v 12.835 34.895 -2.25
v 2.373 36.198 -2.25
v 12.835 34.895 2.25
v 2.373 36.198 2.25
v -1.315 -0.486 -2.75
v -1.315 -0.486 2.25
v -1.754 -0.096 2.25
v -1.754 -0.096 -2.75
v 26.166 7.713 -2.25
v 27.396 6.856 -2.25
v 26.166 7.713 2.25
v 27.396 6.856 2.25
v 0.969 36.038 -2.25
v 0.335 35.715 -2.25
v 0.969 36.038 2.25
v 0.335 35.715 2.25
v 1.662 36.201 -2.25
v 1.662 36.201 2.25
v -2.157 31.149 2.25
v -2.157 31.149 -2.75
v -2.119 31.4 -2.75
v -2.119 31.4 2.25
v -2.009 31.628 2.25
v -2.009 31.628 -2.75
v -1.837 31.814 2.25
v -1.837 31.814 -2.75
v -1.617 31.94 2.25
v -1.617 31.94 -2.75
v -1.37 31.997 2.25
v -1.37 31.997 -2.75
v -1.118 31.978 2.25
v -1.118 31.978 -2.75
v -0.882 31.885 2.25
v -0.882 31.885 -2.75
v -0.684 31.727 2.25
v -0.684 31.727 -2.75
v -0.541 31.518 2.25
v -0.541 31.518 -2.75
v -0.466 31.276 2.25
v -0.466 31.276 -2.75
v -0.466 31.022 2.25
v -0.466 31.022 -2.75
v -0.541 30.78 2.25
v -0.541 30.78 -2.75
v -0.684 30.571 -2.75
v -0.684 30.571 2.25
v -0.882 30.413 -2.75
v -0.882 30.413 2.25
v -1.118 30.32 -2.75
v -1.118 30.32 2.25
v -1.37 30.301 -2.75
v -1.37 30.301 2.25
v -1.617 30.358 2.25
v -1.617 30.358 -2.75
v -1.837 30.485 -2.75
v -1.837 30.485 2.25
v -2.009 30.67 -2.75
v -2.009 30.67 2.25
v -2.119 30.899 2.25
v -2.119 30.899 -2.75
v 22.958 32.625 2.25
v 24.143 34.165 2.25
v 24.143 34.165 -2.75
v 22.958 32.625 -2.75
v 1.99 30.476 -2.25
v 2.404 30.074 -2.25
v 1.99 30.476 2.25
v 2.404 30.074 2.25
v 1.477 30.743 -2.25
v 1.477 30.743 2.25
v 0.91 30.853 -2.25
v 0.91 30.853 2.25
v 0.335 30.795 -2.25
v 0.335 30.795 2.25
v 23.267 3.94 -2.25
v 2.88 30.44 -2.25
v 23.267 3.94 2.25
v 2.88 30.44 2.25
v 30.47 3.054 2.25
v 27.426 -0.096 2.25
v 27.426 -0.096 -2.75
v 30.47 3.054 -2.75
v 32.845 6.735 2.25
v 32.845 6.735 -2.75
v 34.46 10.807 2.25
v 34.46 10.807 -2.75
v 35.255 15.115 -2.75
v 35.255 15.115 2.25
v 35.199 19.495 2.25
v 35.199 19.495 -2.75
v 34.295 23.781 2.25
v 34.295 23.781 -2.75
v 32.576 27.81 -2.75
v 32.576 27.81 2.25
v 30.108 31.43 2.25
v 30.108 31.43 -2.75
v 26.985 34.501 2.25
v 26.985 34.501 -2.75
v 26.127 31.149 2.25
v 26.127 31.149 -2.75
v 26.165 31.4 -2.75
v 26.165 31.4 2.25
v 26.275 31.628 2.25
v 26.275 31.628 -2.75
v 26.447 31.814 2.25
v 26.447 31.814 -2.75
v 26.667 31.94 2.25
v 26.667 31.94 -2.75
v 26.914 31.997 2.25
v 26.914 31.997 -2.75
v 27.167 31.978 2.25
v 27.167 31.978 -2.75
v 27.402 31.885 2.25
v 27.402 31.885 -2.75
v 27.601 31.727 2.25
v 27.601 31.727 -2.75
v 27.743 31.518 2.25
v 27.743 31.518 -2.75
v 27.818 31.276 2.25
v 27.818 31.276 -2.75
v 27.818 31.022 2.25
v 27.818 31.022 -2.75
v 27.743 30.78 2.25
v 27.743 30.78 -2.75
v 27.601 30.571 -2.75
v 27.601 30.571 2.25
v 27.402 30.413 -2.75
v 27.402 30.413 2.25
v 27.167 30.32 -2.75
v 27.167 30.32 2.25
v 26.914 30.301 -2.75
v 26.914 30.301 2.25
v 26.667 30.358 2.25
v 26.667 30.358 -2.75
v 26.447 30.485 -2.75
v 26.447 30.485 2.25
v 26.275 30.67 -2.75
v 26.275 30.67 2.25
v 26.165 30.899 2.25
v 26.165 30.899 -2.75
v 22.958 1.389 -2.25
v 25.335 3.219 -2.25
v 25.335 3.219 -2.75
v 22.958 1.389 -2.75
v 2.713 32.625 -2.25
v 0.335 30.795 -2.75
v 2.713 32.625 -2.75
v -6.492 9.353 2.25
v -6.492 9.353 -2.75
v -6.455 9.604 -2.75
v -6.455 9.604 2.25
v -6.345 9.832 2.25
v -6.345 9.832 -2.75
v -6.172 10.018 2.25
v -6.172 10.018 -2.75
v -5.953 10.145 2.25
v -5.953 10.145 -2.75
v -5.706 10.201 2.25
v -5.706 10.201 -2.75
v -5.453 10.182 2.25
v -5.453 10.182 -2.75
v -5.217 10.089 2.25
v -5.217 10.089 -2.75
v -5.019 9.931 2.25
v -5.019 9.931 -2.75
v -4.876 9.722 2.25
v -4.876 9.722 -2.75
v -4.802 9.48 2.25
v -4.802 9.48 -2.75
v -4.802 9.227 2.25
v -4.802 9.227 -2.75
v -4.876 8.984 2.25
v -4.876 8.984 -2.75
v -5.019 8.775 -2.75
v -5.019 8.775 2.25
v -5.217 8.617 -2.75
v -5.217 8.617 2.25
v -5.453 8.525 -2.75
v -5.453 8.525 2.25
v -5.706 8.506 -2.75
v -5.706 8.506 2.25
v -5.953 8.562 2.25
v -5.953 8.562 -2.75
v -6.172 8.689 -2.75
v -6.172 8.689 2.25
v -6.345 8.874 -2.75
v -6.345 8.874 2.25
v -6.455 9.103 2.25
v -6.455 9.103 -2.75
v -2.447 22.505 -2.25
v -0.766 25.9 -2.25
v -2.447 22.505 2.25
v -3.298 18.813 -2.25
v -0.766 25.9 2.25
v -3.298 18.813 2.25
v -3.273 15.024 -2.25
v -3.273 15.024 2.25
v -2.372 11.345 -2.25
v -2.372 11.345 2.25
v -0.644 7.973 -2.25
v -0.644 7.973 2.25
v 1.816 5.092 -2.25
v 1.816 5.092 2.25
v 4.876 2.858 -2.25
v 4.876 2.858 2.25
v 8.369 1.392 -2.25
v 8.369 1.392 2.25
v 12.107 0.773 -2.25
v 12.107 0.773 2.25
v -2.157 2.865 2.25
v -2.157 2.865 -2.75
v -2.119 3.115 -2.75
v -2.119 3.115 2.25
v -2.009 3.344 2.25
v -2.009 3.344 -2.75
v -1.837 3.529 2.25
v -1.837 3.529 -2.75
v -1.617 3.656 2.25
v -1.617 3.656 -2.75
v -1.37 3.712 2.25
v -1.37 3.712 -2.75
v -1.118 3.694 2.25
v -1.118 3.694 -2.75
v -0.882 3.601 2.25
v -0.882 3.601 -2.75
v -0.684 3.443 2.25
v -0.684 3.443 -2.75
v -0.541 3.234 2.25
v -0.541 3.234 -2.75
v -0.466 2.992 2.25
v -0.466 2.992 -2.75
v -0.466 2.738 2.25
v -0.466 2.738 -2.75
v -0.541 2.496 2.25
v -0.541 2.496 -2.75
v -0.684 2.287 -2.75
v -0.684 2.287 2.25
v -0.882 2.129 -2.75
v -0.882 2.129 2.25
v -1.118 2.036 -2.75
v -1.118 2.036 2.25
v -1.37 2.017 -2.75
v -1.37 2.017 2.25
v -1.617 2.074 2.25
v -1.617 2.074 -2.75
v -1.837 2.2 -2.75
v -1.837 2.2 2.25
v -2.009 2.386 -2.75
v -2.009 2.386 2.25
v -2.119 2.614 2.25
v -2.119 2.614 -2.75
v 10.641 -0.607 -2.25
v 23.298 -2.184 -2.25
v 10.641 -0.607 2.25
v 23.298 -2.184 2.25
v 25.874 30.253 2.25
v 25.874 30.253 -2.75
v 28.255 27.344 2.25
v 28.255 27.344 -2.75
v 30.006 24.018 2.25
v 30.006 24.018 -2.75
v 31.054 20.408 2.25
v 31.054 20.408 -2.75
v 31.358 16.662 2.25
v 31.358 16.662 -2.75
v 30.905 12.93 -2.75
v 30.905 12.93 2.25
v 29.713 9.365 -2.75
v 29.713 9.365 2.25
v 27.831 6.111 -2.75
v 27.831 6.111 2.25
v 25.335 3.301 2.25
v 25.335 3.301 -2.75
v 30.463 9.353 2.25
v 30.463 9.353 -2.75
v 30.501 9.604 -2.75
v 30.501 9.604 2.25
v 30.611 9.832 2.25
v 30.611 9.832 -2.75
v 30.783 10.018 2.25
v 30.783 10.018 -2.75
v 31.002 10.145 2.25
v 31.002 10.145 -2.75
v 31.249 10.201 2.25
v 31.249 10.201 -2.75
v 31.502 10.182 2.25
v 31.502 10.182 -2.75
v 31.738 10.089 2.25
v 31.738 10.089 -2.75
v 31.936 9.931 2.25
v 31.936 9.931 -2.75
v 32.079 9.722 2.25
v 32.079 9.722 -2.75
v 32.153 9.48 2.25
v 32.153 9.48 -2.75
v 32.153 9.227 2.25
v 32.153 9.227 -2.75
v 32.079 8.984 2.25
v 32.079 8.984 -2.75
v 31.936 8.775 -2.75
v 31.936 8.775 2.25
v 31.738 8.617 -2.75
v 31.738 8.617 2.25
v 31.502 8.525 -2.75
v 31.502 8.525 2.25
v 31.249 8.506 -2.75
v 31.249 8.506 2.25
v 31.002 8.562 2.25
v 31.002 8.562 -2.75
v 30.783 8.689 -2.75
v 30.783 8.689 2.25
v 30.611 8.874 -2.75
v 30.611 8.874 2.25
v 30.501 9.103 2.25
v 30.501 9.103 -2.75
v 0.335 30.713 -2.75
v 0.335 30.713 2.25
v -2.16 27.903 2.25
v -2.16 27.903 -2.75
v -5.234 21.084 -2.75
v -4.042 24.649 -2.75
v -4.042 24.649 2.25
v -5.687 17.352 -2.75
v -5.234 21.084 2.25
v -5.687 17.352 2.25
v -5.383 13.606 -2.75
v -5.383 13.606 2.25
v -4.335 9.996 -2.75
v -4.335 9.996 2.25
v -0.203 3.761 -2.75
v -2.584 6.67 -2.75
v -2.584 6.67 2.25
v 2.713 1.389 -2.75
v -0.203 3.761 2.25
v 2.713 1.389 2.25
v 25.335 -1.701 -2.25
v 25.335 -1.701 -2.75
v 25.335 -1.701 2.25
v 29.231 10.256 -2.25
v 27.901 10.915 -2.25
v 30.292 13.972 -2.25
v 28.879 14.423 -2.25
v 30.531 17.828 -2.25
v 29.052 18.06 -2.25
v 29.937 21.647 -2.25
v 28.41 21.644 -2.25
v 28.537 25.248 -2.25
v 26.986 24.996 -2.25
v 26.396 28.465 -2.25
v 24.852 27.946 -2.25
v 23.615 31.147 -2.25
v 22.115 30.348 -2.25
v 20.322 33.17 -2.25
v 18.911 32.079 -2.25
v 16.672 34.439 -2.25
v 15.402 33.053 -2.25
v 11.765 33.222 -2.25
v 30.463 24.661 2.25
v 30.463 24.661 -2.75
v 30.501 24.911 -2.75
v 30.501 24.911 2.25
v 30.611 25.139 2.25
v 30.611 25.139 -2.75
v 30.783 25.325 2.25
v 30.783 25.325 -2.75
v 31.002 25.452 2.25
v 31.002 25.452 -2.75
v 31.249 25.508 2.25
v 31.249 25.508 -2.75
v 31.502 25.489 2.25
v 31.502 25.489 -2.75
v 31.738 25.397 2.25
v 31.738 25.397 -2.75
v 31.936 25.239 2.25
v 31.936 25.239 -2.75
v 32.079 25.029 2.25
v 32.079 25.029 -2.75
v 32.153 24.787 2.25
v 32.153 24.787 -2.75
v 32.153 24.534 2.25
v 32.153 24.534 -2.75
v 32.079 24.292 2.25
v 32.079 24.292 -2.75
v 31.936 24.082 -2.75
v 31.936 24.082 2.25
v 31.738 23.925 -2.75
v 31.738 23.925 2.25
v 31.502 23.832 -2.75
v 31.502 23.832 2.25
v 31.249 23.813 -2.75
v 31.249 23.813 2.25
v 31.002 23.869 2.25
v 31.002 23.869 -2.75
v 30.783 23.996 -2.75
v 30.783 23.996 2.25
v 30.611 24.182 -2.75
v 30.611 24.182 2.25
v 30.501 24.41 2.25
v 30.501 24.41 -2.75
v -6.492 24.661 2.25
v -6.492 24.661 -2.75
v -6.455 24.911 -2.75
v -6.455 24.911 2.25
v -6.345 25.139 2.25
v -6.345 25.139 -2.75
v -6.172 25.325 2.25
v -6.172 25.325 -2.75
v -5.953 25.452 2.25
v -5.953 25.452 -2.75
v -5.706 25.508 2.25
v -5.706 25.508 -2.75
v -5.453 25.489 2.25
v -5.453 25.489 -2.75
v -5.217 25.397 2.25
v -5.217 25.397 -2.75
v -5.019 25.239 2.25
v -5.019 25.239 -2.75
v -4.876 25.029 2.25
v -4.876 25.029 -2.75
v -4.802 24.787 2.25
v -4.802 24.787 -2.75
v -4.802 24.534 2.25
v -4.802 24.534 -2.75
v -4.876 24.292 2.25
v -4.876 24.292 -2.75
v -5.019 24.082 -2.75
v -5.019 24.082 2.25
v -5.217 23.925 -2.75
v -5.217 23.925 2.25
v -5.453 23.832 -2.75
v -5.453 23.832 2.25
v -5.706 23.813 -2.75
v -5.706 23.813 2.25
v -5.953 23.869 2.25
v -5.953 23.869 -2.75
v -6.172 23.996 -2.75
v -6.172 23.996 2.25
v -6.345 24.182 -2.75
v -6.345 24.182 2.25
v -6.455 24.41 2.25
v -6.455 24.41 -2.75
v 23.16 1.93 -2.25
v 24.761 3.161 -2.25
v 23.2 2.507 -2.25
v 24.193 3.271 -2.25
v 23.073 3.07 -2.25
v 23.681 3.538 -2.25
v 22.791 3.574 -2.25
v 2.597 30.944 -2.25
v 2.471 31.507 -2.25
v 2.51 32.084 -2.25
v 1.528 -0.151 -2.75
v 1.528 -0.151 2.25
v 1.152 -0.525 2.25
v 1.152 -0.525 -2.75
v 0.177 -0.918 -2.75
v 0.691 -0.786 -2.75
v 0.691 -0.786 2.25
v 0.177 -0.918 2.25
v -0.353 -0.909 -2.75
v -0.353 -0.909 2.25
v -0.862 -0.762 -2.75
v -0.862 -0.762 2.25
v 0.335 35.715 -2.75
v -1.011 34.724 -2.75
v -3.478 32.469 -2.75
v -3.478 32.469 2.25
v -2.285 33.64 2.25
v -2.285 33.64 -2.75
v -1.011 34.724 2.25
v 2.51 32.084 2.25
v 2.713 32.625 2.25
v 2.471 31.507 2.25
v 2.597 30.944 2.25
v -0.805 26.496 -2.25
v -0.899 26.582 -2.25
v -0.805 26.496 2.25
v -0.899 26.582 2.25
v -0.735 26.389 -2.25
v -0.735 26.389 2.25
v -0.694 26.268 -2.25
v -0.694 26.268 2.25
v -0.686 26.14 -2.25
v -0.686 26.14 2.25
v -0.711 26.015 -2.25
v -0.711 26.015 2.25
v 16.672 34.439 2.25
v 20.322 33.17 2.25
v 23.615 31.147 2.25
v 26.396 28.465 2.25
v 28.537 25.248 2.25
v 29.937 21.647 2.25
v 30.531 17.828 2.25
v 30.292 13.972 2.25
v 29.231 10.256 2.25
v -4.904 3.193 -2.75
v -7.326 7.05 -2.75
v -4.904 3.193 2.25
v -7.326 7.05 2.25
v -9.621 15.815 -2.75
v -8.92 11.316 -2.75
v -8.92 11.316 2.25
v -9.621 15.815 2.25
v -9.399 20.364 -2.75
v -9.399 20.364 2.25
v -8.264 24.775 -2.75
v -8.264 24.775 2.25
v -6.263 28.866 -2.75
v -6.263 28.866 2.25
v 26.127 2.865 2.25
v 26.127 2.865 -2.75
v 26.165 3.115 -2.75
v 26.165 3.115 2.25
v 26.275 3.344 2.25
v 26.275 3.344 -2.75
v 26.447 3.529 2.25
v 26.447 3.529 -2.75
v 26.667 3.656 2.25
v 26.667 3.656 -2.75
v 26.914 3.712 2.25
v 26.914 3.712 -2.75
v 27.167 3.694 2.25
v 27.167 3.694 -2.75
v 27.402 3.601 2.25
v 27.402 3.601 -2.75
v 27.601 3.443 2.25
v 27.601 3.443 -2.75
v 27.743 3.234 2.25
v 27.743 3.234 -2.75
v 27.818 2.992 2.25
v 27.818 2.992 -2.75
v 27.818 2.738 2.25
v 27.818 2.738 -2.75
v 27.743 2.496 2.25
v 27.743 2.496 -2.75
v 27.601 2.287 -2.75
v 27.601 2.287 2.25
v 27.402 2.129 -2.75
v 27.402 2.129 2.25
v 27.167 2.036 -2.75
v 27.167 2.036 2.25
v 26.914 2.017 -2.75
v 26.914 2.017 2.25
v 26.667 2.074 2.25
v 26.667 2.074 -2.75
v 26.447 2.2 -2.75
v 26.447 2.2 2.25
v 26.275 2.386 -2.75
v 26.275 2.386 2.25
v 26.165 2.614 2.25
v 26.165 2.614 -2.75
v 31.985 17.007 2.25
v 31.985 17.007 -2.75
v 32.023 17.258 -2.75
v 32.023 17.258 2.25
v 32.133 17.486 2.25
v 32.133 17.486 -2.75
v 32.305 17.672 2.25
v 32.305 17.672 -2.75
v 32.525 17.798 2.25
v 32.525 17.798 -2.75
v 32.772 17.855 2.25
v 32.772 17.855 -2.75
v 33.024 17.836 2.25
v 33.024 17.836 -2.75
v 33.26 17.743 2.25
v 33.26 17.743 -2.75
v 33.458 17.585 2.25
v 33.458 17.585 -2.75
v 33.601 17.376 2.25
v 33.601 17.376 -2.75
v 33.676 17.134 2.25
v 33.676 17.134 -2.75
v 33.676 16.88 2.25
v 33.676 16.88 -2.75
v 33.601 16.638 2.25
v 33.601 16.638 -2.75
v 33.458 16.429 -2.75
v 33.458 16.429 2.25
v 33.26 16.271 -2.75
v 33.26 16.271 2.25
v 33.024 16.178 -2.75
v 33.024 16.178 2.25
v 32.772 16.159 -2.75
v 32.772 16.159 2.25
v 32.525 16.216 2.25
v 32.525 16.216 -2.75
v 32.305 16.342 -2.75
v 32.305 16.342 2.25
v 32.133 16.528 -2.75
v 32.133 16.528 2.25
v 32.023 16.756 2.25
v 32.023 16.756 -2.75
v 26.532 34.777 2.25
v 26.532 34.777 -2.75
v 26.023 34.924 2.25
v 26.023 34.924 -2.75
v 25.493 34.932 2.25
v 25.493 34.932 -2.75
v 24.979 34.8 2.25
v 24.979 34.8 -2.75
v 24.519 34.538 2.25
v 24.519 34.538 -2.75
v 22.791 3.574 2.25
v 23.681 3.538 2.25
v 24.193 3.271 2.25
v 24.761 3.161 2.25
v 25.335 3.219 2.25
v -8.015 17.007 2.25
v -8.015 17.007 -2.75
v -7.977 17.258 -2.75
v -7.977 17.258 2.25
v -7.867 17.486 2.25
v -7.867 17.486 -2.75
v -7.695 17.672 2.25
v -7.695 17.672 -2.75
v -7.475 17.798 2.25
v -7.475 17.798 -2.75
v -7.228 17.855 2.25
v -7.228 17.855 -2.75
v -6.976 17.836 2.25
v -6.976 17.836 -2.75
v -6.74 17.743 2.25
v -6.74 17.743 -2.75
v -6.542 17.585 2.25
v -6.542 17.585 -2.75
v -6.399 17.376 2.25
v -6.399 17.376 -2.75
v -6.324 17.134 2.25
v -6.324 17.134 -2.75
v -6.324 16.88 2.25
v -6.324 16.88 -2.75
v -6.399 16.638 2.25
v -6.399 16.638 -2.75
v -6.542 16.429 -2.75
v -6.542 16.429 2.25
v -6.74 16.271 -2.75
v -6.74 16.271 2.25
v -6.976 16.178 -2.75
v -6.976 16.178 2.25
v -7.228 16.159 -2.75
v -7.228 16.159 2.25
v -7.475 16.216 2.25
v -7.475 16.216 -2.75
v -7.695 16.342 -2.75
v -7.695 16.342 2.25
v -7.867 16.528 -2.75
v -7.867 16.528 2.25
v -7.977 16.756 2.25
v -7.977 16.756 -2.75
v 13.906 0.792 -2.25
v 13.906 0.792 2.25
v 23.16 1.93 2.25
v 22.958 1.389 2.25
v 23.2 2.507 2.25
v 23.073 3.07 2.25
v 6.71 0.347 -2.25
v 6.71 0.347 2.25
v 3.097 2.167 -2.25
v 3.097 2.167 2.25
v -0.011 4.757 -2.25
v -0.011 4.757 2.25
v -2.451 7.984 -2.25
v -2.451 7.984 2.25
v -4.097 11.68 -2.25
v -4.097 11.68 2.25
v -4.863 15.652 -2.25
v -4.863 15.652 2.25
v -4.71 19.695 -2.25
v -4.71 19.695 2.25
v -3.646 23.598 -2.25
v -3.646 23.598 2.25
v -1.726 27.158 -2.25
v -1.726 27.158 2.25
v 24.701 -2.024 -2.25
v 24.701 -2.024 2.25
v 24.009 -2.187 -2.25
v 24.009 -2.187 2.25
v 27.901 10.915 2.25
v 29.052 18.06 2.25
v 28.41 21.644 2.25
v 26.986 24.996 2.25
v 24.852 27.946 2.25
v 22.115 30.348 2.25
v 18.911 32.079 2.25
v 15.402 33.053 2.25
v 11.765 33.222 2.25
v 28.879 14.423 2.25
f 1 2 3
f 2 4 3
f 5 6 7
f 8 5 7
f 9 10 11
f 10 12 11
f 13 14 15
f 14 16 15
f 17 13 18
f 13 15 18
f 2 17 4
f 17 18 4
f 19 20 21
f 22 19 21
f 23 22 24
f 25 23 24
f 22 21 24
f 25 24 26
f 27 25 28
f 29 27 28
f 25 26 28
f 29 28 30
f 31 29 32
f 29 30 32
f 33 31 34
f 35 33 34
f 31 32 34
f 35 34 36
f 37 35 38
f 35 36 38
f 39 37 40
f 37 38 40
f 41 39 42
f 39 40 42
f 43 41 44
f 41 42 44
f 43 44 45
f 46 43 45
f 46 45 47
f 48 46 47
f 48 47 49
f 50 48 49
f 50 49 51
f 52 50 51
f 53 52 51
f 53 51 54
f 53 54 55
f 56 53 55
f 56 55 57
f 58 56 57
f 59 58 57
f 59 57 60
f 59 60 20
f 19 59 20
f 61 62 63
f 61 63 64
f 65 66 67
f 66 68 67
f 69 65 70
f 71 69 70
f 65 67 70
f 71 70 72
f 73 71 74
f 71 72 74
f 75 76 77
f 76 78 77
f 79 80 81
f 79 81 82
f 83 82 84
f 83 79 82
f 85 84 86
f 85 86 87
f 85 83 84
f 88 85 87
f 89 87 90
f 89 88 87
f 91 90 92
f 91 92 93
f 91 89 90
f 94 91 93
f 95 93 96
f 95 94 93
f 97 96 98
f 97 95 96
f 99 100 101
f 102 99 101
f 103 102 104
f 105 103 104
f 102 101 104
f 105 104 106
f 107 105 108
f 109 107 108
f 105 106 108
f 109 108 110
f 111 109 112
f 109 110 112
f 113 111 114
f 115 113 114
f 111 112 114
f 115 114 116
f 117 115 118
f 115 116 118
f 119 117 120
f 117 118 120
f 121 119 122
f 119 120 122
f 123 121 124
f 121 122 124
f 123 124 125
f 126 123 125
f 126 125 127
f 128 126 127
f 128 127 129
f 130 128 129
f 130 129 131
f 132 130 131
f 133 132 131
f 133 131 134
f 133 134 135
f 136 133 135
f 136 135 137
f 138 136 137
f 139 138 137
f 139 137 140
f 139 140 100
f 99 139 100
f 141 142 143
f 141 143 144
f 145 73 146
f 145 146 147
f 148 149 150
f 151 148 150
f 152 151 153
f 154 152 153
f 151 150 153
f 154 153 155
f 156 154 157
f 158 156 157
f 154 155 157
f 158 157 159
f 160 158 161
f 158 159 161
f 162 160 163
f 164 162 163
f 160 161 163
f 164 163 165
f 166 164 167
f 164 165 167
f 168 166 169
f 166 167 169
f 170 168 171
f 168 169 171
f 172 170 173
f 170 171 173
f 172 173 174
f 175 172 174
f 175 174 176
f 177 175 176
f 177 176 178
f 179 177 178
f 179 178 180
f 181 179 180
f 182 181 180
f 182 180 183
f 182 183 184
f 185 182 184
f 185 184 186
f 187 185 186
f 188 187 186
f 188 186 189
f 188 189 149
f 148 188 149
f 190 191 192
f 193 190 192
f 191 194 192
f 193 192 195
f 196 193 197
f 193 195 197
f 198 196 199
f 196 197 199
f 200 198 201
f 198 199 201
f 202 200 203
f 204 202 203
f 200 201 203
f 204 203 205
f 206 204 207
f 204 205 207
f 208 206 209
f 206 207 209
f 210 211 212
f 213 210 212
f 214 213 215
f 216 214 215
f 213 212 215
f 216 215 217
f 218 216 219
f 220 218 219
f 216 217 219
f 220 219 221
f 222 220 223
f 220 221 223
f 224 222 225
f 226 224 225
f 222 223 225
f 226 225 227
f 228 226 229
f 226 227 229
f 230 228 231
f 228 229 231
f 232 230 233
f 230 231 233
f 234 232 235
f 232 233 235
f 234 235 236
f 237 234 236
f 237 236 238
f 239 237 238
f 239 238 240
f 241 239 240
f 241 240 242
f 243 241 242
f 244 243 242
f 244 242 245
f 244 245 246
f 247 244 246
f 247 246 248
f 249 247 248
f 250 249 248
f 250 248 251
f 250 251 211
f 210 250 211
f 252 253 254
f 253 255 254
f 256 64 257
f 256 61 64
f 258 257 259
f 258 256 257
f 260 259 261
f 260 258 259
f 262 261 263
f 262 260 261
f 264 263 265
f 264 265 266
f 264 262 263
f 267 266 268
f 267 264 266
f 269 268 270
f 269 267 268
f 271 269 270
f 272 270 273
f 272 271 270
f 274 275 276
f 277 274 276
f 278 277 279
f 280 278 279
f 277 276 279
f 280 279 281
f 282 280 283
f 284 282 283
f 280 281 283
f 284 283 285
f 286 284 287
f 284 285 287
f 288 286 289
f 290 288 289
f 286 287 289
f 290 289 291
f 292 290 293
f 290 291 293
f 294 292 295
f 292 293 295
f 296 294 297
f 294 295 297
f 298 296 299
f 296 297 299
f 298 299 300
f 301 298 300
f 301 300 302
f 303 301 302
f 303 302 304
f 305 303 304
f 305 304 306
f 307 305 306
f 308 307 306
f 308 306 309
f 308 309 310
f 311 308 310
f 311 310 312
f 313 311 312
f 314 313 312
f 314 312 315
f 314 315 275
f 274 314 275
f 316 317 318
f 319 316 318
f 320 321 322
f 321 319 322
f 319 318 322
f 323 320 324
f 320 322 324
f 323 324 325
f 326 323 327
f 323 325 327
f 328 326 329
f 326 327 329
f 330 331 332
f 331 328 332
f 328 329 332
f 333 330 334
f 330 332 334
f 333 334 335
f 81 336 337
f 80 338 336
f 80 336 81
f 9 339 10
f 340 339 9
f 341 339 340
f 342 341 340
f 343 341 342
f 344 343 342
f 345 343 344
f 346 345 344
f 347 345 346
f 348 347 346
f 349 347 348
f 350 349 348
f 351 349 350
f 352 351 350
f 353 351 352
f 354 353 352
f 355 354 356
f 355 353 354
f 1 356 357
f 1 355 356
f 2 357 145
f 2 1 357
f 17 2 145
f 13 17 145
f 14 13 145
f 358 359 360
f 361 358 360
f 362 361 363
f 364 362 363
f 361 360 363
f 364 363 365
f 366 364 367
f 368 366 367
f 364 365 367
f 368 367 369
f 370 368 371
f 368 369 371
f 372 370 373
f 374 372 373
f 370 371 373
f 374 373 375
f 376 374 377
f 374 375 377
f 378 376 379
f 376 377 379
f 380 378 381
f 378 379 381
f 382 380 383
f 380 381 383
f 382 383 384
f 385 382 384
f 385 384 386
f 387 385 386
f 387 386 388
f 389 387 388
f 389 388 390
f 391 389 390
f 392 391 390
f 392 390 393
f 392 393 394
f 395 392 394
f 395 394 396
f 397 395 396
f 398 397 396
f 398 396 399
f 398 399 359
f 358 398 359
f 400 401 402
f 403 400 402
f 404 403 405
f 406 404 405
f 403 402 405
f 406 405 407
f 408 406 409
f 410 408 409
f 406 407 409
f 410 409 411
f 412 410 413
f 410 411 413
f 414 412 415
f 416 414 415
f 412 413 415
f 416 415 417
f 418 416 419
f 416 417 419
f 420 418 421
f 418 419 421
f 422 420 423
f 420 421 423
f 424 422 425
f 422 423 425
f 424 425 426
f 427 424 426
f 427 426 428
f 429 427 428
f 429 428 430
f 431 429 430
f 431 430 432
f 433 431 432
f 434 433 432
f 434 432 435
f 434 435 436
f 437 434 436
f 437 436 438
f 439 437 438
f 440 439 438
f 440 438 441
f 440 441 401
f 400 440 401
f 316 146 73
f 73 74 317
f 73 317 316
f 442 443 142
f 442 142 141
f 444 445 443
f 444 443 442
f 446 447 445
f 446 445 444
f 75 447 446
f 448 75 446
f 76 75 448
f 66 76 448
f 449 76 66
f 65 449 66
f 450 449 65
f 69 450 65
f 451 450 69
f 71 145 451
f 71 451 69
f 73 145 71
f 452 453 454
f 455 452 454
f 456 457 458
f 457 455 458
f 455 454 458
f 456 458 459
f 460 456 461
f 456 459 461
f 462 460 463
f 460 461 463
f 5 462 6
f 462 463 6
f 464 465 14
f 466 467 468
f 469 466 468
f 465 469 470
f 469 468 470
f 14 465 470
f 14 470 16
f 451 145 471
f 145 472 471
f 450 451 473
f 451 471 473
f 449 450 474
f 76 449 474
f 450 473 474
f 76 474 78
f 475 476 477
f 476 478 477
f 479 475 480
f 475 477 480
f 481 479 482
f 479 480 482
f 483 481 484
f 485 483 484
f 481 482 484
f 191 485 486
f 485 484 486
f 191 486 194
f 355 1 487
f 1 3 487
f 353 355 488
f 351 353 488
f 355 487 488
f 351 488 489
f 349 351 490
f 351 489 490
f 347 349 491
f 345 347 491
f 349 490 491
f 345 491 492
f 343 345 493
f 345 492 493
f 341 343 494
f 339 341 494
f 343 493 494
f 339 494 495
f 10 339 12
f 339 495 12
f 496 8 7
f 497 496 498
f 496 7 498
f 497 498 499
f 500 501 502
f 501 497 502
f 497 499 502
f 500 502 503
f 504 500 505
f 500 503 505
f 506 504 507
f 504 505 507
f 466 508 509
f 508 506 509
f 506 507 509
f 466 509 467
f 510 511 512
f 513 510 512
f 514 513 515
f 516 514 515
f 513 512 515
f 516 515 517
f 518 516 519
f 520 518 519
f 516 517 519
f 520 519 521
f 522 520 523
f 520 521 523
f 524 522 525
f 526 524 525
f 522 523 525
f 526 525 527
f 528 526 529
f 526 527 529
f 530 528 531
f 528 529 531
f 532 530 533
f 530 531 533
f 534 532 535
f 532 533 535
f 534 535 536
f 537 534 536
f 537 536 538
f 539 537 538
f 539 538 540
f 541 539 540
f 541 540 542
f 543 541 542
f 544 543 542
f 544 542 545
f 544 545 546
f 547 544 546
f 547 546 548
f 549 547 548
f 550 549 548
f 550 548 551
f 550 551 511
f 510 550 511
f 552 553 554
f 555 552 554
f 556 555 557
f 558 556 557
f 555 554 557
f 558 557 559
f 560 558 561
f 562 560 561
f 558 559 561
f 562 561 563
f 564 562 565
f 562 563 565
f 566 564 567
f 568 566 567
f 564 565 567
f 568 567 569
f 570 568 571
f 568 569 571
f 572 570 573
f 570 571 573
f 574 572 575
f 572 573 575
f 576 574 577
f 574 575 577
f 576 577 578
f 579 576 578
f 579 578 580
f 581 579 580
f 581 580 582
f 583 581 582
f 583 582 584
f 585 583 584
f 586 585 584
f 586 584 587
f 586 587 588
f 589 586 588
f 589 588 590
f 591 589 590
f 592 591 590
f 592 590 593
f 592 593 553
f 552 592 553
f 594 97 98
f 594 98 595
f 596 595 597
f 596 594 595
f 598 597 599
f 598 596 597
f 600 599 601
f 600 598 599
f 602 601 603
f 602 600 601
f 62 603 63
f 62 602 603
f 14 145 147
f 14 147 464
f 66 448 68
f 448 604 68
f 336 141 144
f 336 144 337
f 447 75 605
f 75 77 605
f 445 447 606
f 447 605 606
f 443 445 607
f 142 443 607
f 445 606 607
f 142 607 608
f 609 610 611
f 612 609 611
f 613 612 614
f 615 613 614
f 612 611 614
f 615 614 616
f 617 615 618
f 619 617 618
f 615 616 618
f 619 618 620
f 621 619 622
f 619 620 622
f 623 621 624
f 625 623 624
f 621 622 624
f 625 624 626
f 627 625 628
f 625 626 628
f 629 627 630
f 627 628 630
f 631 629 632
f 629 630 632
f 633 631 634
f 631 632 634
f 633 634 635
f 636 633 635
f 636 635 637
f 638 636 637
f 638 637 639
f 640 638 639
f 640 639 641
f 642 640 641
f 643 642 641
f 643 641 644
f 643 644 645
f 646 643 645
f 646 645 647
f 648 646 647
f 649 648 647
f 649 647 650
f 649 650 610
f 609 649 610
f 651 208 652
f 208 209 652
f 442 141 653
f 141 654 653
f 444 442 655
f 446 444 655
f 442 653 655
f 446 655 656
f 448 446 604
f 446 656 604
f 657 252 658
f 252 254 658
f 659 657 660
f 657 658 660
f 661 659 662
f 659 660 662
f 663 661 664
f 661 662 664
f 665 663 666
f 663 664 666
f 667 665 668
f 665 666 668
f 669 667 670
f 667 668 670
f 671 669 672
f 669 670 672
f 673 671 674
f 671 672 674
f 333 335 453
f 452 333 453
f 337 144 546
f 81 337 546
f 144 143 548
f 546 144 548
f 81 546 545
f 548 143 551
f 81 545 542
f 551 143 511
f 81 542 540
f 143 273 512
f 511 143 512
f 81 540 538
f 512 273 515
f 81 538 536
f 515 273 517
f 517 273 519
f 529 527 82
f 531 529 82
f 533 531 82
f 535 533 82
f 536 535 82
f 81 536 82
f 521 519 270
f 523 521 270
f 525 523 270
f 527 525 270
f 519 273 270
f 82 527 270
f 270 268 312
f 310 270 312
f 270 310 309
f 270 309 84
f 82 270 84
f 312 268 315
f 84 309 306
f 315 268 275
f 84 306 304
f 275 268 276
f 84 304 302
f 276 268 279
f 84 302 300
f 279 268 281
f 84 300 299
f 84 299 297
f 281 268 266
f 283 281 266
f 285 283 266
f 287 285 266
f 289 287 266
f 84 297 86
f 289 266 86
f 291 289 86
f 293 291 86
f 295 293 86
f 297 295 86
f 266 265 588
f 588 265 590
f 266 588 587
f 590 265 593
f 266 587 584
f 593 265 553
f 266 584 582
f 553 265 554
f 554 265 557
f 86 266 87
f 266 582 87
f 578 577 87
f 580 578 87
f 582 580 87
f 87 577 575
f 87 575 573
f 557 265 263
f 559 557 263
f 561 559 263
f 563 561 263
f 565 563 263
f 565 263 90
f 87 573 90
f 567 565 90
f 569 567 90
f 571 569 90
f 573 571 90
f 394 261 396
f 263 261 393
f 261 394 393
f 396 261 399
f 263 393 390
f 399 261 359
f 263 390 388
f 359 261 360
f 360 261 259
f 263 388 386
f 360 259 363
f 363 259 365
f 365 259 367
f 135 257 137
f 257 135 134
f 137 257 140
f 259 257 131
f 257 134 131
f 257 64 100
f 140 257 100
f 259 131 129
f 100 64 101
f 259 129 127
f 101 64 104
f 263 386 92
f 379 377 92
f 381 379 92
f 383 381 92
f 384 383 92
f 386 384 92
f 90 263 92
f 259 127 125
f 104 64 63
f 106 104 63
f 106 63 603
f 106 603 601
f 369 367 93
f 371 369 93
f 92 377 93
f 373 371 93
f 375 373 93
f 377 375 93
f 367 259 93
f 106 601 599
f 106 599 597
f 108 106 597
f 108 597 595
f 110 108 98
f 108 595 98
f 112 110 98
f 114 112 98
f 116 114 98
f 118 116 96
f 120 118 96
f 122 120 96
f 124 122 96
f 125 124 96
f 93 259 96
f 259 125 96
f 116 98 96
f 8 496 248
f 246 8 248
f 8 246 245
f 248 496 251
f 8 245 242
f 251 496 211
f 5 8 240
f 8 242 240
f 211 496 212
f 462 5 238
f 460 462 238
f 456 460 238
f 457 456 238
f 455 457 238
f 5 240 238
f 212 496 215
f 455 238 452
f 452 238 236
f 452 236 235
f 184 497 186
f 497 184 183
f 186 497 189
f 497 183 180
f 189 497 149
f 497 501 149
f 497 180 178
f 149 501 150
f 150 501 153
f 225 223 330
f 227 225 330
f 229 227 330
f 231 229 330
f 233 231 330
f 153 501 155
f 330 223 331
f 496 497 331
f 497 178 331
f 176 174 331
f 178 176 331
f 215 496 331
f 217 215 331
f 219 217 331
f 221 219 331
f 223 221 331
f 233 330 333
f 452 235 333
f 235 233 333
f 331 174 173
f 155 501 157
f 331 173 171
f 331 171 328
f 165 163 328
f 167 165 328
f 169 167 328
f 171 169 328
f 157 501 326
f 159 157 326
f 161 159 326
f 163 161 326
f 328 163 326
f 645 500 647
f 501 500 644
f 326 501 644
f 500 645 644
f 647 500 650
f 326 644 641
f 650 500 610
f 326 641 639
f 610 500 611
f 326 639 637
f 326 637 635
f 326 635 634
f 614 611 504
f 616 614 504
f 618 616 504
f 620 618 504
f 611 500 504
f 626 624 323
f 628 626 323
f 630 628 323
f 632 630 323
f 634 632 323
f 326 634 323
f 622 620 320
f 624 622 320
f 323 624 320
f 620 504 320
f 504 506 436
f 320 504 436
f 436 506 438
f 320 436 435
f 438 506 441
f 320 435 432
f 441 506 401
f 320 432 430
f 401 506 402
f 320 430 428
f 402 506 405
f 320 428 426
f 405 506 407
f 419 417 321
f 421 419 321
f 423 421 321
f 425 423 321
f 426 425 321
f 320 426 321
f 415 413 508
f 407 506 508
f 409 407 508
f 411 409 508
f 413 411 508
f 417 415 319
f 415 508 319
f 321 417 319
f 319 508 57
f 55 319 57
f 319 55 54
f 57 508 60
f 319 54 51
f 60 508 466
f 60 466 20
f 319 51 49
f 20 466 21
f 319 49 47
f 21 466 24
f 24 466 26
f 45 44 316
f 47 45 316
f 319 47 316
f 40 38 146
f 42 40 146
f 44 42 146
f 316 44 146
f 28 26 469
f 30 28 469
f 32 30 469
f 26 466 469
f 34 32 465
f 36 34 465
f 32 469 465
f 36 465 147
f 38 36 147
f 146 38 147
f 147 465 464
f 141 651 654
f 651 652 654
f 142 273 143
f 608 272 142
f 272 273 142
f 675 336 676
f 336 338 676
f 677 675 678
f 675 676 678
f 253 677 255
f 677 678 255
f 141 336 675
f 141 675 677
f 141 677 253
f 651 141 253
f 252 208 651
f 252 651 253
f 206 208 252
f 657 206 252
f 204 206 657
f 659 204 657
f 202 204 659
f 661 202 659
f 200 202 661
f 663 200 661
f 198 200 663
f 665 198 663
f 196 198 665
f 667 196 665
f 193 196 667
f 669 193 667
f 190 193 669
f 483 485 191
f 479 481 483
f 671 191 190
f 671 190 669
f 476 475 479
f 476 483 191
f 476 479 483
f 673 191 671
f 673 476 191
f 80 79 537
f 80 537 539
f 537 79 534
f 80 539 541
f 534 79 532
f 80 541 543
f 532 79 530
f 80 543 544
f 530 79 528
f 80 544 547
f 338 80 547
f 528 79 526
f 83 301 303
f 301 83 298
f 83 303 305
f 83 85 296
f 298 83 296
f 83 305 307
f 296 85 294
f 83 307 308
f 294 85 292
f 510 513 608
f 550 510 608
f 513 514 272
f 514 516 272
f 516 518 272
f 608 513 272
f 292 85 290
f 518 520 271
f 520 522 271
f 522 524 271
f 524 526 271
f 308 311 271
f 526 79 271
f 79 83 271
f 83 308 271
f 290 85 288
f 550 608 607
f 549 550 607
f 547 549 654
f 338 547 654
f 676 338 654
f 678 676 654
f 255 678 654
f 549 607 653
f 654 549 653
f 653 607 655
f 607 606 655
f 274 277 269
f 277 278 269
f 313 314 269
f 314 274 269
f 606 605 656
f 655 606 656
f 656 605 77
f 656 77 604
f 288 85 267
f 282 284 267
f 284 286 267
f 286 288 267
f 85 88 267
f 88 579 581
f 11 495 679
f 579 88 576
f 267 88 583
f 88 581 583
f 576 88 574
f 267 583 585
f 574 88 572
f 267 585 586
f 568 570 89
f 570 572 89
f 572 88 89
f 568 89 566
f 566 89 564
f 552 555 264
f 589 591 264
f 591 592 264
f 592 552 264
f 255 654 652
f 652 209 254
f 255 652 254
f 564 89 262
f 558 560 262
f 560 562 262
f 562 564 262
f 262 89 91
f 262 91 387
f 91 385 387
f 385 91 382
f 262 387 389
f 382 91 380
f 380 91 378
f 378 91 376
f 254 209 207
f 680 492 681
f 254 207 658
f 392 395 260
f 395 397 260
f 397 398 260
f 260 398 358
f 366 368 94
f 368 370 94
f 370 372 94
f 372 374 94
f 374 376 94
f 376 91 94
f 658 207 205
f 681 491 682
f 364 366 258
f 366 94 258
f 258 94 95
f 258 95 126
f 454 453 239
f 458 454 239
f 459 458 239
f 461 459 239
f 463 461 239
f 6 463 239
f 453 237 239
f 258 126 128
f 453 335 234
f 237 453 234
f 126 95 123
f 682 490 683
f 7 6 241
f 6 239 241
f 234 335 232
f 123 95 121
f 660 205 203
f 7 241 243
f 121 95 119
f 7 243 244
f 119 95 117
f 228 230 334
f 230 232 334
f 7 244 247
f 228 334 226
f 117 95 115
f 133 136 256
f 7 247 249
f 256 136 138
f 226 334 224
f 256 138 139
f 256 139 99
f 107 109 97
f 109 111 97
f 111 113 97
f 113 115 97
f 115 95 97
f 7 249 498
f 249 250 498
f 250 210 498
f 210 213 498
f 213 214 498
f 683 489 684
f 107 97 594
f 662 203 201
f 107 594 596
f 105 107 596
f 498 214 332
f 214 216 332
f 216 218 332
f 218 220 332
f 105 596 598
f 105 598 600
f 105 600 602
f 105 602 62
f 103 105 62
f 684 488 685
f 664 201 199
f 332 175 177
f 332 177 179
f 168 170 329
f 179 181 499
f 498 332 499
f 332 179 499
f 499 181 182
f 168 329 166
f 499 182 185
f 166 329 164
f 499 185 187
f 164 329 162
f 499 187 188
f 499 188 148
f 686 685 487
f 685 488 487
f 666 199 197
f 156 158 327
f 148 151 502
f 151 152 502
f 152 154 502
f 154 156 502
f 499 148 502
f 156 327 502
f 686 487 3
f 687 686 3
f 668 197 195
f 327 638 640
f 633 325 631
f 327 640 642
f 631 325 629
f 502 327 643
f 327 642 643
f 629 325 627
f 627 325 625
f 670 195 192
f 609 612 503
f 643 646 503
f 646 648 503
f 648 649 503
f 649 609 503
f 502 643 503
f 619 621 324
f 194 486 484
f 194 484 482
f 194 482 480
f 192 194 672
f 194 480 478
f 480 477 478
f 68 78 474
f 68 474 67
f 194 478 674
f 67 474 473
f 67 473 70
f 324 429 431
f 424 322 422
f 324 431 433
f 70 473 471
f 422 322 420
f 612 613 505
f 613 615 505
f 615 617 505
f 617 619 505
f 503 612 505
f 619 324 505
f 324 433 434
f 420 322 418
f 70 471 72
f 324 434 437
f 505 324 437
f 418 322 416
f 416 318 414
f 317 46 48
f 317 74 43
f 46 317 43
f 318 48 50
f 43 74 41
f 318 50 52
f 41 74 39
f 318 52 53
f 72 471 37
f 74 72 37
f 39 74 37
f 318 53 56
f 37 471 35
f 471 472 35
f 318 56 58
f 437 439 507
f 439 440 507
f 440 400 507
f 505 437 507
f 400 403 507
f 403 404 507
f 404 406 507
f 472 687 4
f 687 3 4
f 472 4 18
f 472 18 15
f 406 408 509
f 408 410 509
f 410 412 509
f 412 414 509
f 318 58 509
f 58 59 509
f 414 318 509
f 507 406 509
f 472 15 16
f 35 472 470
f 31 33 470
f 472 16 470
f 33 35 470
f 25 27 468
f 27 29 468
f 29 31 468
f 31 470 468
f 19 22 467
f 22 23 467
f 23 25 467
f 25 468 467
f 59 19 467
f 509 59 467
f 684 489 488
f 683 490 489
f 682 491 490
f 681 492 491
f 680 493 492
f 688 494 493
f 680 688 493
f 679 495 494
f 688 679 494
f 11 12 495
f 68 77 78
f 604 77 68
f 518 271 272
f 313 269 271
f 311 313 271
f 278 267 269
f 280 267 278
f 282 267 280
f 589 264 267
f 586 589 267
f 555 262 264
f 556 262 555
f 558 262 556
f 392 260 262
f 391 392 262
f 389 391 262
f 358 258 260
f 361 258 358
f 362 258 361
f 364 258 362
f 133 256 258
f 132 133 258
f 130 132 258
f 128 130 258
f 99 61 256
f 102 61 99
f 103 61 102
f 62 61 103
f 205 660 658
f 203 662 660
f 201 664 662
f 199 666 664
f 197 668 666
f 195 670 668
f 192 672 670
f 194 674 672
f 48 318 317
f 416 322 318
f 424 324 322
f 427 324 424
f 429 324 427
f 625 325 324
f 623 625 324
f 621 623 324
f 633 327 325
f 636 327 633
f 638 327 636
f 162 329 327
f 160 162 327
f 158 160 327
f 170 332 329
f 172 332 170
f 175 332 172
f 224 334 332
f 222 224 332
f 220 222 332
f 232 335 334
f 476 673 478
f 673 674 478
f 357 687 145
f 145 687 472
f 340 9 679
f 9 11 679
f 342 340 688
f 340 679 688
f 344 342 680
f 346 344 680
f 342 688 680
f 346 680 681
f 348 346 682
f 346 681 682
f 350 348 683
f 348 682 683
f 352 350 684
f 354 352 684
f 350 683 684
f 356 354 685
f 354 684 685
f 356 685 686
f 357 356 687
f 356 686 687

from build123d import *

# Parameters (mm, degrees)
BOSS_EXTRUDE1_DEPTH     = 2.25
BOSS_EXTRUDE2_DEPTH     = 0.5
SKETCH5_R               = 0.850002184
CUT_EXTRUDE1_DEPTH      = 1
CUT_EXTRUDE1_DEPTH_BACK = 6


with BuildPart() as part:
    # Sketch2 → Boss-Extrude1 (new body, symmetric)
    with BuildSketch(Plane.XY):
        with BuildLine():
            Line((2.713147674, 1.38944985), (1.528065997, -0.150989389))
            ThreePointArc((1.528065997, -0.150989389), (0.17725111, -0.917704623), (-1.31492025, -0.486453258))
            Line((-1.31492025, -0.486453258), (-1.753865618, -0.096037363))
            ThreePointArc((-1.753865618, -0.096037363), (-9.620538113, 15.815478855), (-3.478285545, 32.468815395))
            ThreePointArc((-3.478285545, 32.468815395), (-1.657553469, 34.19316142), (0.335322036, 35.715292075))
            ThreePointArc((0.335322036, 35.715292075), (1.310576189, 36.140071747), (2.372755236, 36.197813468))
            Line((2.372755236, 36.197813468), (12.835373957, 34.894529227))
            ThreePointArc((12.835373957, 34.894529227), (28.536577221, 25.247997312), (27.396378685, 6.85551762))
            Line((27.396378685, 6.85551762), (26.165923945, 7.71335154))
            ThreePointArc((26.165923945, 7.71335154), (26.986392928, 24.995972492), (11.764919509, 33.222083557))
            Line((11.764919509, 33.222083557), (2.713147674, 32.624522546))
            ThreePointArc((2.713147674, 32.624522546), (2.470709746, 31.507408509), (2.879736705, 30.439973796))
            Line((2.879736705, 30.439973796), (23.266595715, 3.939876853))
            ThreePointArc((23.266595715, 3.939876853), (24.193426287, 3.270845706), (25.335310798, 3.218717494))
            Line((25.335310798, 3.218717494), (25.335310798, 3.30054722))
            ThreePointArc((25.335310798, 3.30054722), (31.300372108, 18.542612289), (22.957572367, 32.624522546))
            Line((22.957572367, 32.624522546), (24.142654044, 34.164961785))
            ThreePointArc((24.142654044, 34.164961785), (25.492802118, 34.931598224), (26.984595921, 34.501269859))
            ThreePointArc((26.984595921, 34.501269859), (35.334137123, 17.306419127), (27.42640432, -0.096037363))
            Line((27.42640432, -0.096037363), (25.335310798, -1.701329119))
            ThreePointArc((25.335310798, -1.701329119), (24.360060505, -2.126090593), (23.297891975, -2.183826688))
            Line((23.297891975, -2.183826688), (10.641243869, -0.60724147))
            ThreePointArc((10.641243869, -0.60724147), (-3.379346512, 9.784930922), (-1.725632249, 27.158457646))
            Line((-1.725632249, 27.158457646), (-0.899188364, 26.582287247))
            ThreePointArc((-0.899188364, 26.582287247), (-0.694395528, 26.267887803), (-0.765964702, 25.899560545))
            ThreePointArc((-0.765964702, 25.899560545), (-1.606558349, 9.608289856), (12.106530022, 0.772945738))
            Line((12.106530022, 0.772945738), (13.905800532, 0.791888839))
            Line((13.905800532, 0.791888839), (22.957572367, 1.38944985))
            ThreePointArc((22.957572367, 1.38944985), (23.200013724, 2.506566373), (22.790986515, 3.574004371))
            Line((22.790986515, 3.574004371), (2.404127505, 30.074101314))
            ThreePointArc((2.404127505, 30.074101314), (1.477253865, 30.743151427), (0.335322036, 30.795252278))
            Line((0.335322036, 30.795252278), (0.335322036, 30.713422552))
            ThreePointArc((0.335322036, 30.713422552), (-5.629385297, 15.471362635), (2.713147674, 1.38944985))
        make_face()
    extrude(amount=BOSS_EXTRUDE1_DEPTH, both=True)

    # Sketch3 → Boss-Extrude2 (add)
    with BuildSketch(Plane(origin=(0, 0, -2.25), x_dir=(-1, 0, 0), z_dir=(0, 0, -1))):
        with BuildLine():
            Line((-25.335310798, 3.218717494), (-22.957572367, 1.38944985))
            Line((-22.957572367, 1.38944985), (-25.335310798, -1.701329119))
            Line((-25.335310798, -1.701329119), (-27.42640432, -0.096037363))
            ThreePointArc((-27.42640432, -0.096037363), (-35.334137123, 17.306419127), (-26.984595921, 34.501269859))
            ThreePointArc((-26.984595921, 34.501269859), (-25.492802118, 34.931598224), (-24.142654044, 34.164961785))
            Line((-24.142654044, 34.164961785), (-22.957572367, 32.624522546))
            ThreePointArc((-22.957572367, 32.624522546), (-31.300372108, 18.542612289), (-25.335310798, 3.30054722))
            Line((-25.335310798, 3.30054722), (-25.335310798, 3.218717494))
        make_face()
        with BuildLine():
            Line((-0.335322036, 30.795252278), (-2.713147674, 32.624522546))
            Line((-2.713147674, 32.624522546), (-0.335322036, 35.715292075))
            ThreePointArc((-0.335322036, 35.715292075), (1.657553469, 34.19316142), (3.478285545, 32.468815395))
            ThreePointArc((3.478285545, 32.468815395), (9.620538113, 15.815478855), (1.753865618, -0.096037363))
            Line((1.753865618, -0.096037363), (1.31492025, -0.486453258))
            ThreePointArc((1.31492025, -0.486453258), (-0.17725111, -0.917704623), (-1.528065997, -0.150989389))
            Line((-1.528065997, -0.150989389), (-2.713147674, 1.38944985))
            ThreePointArc((-2.713147674, 1.38944985), (5.629385297, 15.471362635), (-0.335322036, 30.713422552))
            Line((-0.335322036, 30.713422552), (-0.335322036, 30.795252278))
        make_face()
    extrude(amount=BOSS_EXTRUDE2_DEPTH)

    # Sketch5 → Cut-Extrude1 (cut, two sides)
    with BuildSketch(Plane(origin=(0, 0, -2.75), x_dir=(-1, 0, 0), z_dir=(0, 0, -1))) as cut_extrude1_sk:
        with Locations((-31.312900109, 24.660626427)):
            Circle(SKETCH5_R)
        with Locations((-32.835321764, 17.006965176)):
            Circle(SKETCH5_R)
        with Locations((-31.312900109, 9.353290058)):
            Circle(SKETCH5_R)
        with Locations((-26.977454917, 2.864826813)):
            Circle(SKETCH5_R)
        with Locations((1.306812691, 2.864826813)):
            Circle(SKETCH5_R)
        with Locations((5.642277886, 24.660626427)):
            Circle(SKETCH5_R)
        with Locations((1.306812691, 31.14910354)):
            Circle(SKETCH5_R)
        with Locations((-26.977454917, 31.14910354)):
            Circle(SKETCH5_R)
        with Locations((5.642277886, 9.353290058)):
            Circle(SKETCH5_R)
        with Locations((7.164679538, 17.006965176)):
            Circle(SKETCH5_R)
    extrude(amount=CUT_EXTRUDE1_DEPTH, mode=Mode.SUBTRACT)
    extrude(cut_extrude1_sk.sketch, amount=-CUT_EXTRUDE1_DEPTH_BACK, mode=Mode.SUBTRACT)


solid = part.part
